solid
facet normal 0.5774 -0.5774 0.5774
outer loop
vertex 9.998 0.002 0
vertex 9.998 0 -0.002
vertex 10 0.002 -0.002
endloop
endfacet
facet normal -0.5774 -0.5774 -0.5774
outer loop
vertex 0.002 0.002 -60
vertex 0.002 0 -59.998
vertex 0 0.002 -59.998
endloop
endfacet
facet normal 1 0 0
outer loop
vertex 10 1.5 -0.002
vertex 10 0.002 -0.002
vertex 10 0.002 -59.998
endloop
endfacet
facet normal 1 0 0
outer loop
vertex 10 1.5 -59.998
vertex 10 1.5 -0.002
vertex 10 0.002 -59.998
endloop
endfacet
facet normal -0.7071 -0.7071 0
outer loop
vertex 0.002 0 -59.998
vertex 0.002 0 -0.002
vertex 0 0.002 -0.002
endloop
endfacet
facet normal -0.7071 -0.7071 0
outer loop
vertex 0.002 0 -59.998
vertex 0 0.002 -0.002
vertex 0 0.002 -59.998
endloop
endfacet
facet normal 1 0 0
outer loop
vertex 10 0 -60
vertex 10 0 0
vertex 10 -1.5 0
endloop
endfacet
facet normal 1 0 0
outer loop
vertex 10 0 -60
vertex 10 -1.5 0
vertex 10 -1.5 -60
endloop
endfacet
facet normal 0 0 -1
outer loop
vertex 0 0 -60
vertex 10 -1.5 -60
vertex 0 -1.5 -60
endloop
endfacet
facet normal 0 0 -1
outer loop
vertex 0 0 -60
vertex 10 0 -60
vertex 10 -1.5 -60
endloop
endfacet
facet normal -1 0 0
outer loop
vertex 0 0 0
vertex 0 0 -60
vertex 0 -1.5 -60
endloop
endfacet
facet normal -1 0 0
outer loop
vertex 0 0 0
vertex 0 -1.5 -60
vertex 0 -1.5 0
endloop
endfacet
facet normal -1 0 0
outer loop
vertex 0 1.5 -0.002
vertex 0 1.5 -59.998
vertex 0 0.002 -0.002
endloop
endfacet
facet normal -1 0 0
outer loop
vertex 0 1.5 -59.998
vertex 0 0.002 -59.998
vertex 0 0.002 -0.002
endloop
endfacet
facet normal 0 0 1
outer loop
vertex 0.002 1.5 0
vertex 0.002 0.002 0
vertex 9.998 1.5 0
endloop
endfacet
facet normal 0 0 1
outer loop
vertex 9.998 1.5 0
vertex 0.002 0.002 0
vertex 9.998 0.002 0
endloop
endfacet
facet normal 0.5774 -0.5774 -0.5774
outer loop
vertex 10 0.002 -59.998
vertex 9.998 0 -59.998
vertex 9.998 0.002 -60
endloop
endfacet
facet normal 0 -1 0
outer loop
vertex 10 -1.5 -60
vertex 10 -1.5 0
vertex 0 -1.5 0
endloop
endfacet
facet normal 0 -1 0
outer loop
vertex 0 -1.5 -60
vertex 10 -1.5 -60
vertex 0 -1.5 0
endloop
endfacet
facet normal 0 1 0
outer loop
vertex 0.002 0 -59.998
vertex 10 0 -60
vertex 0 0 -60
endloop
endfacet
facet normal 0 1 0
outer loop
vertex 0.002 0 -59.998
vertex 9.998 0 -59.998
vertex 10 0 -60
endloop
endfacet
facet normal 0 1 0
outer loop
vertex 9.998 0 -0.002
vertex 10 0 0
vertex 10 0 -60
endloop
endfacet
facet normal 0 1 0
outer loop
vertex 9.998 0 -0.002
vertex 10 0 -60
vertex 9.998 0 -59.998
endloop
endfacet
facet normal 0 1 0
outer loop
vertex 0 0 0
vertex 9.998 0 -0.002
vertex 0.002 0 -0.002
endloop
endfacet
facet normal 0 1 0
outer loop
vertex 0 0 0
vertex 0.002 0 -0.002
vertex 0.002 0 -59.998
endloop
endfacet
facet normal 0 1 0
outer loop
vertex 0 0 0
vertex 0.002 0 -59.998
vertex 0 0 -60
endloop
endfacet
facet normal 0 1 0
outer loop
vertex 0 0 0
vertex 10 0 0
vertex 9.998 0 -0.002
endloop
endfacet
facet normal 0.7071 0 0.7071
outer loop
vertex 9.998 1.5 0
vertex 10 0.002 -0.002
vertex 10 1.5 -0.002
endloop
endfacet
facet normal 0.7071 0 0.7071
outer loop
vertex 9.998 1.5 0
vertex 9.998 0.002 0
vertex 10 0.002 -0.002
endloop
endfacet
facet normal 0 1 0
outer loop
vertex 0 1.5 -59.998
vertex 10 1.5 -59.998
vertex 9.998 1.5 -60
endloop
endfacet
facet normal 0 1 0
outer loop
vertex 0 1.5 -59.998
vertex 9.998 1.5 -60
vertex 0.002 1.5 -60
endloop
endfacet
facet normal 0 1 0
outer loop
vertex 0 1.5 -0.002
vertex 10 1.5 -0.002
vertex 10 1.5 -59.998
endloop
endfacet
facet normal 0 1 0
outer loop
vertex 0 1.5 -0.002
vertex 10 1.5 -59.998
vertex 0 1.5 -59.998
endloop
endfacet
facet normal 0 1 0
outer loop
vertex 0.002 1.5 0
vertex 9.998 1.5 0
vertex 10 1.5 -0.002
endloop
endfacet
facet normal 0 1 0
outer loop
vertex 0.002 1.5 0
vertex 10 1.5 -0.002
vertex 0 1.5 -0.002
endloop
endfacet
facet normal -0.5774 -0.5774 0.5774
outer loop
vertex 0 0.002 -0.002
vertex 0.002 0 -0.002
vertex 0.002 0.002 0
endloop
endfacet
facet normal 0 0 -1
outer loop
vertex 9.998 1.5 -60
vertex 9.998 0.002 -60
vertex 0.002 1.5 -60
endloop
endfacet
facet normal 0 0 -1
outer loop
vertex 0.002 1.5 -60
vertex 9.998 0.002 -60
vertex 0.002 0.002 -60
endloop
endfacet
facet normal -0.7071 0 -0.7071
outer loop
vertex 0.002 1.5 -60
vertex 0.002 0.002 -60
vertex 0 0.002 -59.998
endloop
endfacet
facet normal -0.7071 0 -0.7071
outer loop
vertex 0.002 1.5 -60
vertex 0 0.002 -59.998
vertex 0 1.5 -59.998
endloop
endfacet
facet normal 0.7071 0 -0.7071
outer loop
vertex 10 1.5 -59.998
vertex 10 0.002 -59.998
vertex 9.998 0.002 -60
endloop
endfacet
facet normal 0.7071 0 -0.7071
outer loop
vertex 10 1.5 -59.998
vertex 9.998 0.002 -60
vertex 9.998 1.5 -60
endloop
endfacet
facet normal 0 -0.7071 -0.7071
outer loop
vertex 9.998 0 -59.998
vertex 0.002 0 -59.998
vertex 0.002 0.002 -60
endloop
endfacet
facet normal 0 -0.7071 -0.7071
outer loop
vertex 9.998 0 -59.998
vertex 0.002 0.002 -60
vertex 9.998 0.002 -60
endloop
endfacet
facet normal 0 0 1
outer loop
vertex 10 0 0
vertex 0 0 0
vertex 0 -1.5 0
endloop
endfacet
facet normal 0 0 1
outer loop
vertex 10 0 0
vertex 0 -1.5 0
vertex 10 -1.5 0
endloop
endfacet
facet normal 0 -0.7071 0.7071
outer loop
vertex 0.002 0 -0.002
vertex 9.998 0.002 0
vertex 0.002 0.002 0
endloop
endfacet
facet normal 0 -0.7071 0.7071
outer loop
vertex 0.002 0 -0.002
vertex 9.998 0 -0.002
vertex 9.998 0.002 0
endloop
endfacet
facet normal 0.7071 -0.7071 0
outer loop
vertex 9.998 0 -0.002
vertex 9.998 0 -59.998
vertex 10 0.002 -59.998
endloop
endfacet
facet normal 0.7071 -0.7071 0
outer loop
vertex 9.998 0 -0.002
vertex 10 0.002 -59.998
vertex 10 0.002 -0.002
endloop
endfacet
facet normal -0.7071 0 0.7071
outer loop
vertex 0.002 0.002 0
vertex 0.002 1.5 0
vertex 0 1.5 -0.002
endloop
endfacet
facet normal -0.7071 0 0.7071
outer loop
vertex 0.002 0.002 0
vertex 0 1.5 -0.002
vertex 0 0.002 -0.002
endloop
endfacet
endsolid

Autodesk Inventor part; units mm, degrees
ref_plane "YZ Plane" through (0, 0, 0) normal (1, 0, 0) x (0, 1, 0)
ref_plane "XZ Plane" through (0, 0, 0) normal (0, 1, 0) x (-1, 0, 0)
ref_plane "XY Plane" through (0, 0, 0) normal (0, 0, 1) x (1, 0, 0)
sketch "Sketch1" plane through (0, 0, 0) normal (0, 1, 0) x (-1, 0, 0)
  line L0 (0, 0) -> (-10, 0)
  line L1 (-10, 0) -> (-10, -60)
  line L2 (-10, -60) -> (0, -60)
  line L3 (0, -60) -> (0, 0)
  dimension "d0" = 10
  dimension "d1" = 60
extrude "Extrusion1" add sketch "Sketch1" along normal blind 1.5
chamfer "Chamfer1" distance 0.002 angle 45 8 edges at (5, 0, -60) (0, 0, -30) (5, 0, 0) (10, 0, -30) (10, 0.75, -60) (0, 0.75, -60) (0, 0.75, 0) (10, 0.75, 0)
extrude "Extrusion2" add sketch "Sketch1" against normal blind 1.5
equation "\"d0\" = halbachMagnet_width"
equation "\"d1\" = halbachMagnet_length"
equation "\"d2\" = 0.5 * halbachMagnet_height"
equation "\"d7\" = 0.5 * halbachMagnet_height"
equation "\"gap\" = 0.1"
equation "\"airgap\" = 0.4"
equation "\"driveMagnet_height\" = 5"
equation "\"halbachMagnet_length\" = 60"
equation "\"halbachMagnet_width\" = 10"
equation "\"halbachMagnet_height\" = 3"
equation "\"sensorMagnet_diameter\" = 5"
equation "\"sensorMagnet_height\" = 2.66667"
equation "\"wallgap\" = 2"
equation "\"motorRadius\" = 2 * gap + driveMagnet_centerSpacingRadius + driveMagnet_length + 2 * wallgap"
equation "\"shaftDiameter\" = 8"
equation "\"flangeBearing_outerDiameter\" = 16"
equation "\"flangeBearing_innerDiameter\" = shaftDiameter"
equation "\"flangeBearing_height\" = 5"
equation "\"flangeBearing_flangeHeight\" = 1"
equation "\"flangeBearing_flangeDiameter\" = 18"
equation "\"magnetTrapNut_height\" = 1.2"
equation "\"magnetTrapNut_sideToSide\" = 4"
equation "\"magnetTrapBolt_headHeight\" = 2"
equation "\"magnetTrapBolt_headDiameter\" = 3.98"
equation "\"magnetTrapBolt_diameter\" = 2"
equation "\"statorThickness\" = coilThickness + 2 * wallgap"
equation "\"rotor_mountingLipHeight\" = 0.5 * statorThickness"
equation "\"magnetTrapHexNut_sideToSide\" = 4"
equation "\"magnetTrapSquareNut_sideLength\" = 4"
equation "\"magnetTrapSquareNut_height\" = 1.2"
equation "\"magnetTrapHexNut_height\" = 1.2"
equation "\"rotorRadius\" = 2 * gap + driveMagnet_centerSpacingRadius + driveMagnet_length + wallgap"
equation "\"rotorBandSquareNut_sideLength\" = 4"
equation "\"rotorBandHexNut_height\" = 1.2"
equation "\"rotorBandHexNut_sideToSide\" = 4"
equation "\"rotorBandSquareNut_height\" = 1.2"
equation "\"rotorBandBolt_headHeight\" = 2"
equation "\"rotorBandBolt_headDiameter\" = 3.98"
equation "\"rotorBandBolt_diameter\" = 2"
equation "\"rotorBandThickness\" = wallgap + rotorBandBolt_headHeight + gap"
equation "\"flangeCoupling_collarOuterDiameter\" = 16"
equation "\"flangeCoupling_flangeHoleEdgeToEdge\" = 2.05"
equation "\"flangeCoupling_innerDiameter\" = shaftDiameter"
equation "\"flangeCoupling_flangeHoleDiameter\" = 3.9"
equation "\"flangeCoupling_flangeHeight\" = 3.1"
equation "\"flangeCoupling_flangeDiameter\" = 32"
equation "\"flangeCoupling_height\" = flangeCoupling_collarHeight + flangeCoupling_flangeHeight"
equation "\"flangeCoupling_mountHoleDiameter\" = 3.9"
equation "\"flangeCoupling_mountHoleEdgeToEdge\" = 2.05"
equation "\"statorRadius\" = driveMagnet_length + driveMagnet_centerSpacingRadius + 2 * gap"
equation "\"coilThickness\" = 12"
equation "\"statorMountBolt_diameter\" = 4"
equation "\"statorMountBolt_headDiameter\" = 7"
equation "\"statorMountBolt_headHeight\" = 4"
equation "\"statorMountBolt_shaftLength\" = coilThickness + flangeCoupling_flangeHeight + wallgap"
equation "\"statorMountHexNut_height\" = 4"
equation "\"statorMountHexNut_sideToSide\" = 8"
equation "\"sensorMagnet_ringRadius\" = 0.5 * driveMagnet_centerSpacingRadius + 2 * wallgap"
equation "\"coil_percentCoverage\" = 0.6"
equation "\"statorSpokeDegrees\" = 4deg"
equation "\"coil_bulge\" = 3"
equation "\"statorCoilHexNut_height\" = 1.2"
equation "\"statorCoilBolt_headHeight\" = 2"
equation "\"statorCoilBolt_diameter\" = 2"
equation "\"statorCoilBolt_headDiameter\" = 3.98"
equation "\"statorCoilHexNut_sideToSide\" = 4"
equation "\"magnetWire_outerDiameter\" = 0.8128"
equation "\"printingLayerHeight\" = 0.2"
equation "\"circuitBoard_height\" = 1.6"
equation "\"hallEffectSensor_width\" = 1.6"
equation "\"hallEffectSensor_length\" = 3"
equation "\"hallEffectSensor_height\" = 1.1"
equation "\"hallEffectSensor_pinLength\" = 0.6"
equation "\"circuitboardMountHexNut_height\" = 1.2"
equation "\"circuitboardMountHexNut_sideToSide\" = 4"
equation "\"circuitboardMountBolt_headHeight\" = 2"
equation "\"circuitboardMountBolt_shaftLength\" = coilThickness"
equation "\"circuitboardMountBolt_diameter\" = 2"
equation "\"circuitboardMountBolt_headDiameter\" = 3.98"
equation "\"statorShellBolt_headDiameter\" = 5.68"
equation "\"statorShellHexNut_height\" = 2.3"
equation "\"statorShellBolt_shaftLength\" = statorThickness - statorShellBolt_countersinkDepth"
equation "\"statorShellBolt_headHeight\" = 3"
equation "\"statorShellHexNut_sideToSide\" = 5.3"
equation "\"statorShellBolt_diameter\" = 3"
equation "\"flangeCoupling_mountHoleCenterToCouplingCenter\" = 12"
equation "\"driveMagnet_centerSpacingRadius\" = 38.96113"
equation "\"driveMagnet_length\" = 60"
equation "\"flangeCoupling_collarHeight\" = 10"
equation "\"statorShellBolt_countersinkDepth\" = 3.4"
properties part number "HalbachMagnet"
